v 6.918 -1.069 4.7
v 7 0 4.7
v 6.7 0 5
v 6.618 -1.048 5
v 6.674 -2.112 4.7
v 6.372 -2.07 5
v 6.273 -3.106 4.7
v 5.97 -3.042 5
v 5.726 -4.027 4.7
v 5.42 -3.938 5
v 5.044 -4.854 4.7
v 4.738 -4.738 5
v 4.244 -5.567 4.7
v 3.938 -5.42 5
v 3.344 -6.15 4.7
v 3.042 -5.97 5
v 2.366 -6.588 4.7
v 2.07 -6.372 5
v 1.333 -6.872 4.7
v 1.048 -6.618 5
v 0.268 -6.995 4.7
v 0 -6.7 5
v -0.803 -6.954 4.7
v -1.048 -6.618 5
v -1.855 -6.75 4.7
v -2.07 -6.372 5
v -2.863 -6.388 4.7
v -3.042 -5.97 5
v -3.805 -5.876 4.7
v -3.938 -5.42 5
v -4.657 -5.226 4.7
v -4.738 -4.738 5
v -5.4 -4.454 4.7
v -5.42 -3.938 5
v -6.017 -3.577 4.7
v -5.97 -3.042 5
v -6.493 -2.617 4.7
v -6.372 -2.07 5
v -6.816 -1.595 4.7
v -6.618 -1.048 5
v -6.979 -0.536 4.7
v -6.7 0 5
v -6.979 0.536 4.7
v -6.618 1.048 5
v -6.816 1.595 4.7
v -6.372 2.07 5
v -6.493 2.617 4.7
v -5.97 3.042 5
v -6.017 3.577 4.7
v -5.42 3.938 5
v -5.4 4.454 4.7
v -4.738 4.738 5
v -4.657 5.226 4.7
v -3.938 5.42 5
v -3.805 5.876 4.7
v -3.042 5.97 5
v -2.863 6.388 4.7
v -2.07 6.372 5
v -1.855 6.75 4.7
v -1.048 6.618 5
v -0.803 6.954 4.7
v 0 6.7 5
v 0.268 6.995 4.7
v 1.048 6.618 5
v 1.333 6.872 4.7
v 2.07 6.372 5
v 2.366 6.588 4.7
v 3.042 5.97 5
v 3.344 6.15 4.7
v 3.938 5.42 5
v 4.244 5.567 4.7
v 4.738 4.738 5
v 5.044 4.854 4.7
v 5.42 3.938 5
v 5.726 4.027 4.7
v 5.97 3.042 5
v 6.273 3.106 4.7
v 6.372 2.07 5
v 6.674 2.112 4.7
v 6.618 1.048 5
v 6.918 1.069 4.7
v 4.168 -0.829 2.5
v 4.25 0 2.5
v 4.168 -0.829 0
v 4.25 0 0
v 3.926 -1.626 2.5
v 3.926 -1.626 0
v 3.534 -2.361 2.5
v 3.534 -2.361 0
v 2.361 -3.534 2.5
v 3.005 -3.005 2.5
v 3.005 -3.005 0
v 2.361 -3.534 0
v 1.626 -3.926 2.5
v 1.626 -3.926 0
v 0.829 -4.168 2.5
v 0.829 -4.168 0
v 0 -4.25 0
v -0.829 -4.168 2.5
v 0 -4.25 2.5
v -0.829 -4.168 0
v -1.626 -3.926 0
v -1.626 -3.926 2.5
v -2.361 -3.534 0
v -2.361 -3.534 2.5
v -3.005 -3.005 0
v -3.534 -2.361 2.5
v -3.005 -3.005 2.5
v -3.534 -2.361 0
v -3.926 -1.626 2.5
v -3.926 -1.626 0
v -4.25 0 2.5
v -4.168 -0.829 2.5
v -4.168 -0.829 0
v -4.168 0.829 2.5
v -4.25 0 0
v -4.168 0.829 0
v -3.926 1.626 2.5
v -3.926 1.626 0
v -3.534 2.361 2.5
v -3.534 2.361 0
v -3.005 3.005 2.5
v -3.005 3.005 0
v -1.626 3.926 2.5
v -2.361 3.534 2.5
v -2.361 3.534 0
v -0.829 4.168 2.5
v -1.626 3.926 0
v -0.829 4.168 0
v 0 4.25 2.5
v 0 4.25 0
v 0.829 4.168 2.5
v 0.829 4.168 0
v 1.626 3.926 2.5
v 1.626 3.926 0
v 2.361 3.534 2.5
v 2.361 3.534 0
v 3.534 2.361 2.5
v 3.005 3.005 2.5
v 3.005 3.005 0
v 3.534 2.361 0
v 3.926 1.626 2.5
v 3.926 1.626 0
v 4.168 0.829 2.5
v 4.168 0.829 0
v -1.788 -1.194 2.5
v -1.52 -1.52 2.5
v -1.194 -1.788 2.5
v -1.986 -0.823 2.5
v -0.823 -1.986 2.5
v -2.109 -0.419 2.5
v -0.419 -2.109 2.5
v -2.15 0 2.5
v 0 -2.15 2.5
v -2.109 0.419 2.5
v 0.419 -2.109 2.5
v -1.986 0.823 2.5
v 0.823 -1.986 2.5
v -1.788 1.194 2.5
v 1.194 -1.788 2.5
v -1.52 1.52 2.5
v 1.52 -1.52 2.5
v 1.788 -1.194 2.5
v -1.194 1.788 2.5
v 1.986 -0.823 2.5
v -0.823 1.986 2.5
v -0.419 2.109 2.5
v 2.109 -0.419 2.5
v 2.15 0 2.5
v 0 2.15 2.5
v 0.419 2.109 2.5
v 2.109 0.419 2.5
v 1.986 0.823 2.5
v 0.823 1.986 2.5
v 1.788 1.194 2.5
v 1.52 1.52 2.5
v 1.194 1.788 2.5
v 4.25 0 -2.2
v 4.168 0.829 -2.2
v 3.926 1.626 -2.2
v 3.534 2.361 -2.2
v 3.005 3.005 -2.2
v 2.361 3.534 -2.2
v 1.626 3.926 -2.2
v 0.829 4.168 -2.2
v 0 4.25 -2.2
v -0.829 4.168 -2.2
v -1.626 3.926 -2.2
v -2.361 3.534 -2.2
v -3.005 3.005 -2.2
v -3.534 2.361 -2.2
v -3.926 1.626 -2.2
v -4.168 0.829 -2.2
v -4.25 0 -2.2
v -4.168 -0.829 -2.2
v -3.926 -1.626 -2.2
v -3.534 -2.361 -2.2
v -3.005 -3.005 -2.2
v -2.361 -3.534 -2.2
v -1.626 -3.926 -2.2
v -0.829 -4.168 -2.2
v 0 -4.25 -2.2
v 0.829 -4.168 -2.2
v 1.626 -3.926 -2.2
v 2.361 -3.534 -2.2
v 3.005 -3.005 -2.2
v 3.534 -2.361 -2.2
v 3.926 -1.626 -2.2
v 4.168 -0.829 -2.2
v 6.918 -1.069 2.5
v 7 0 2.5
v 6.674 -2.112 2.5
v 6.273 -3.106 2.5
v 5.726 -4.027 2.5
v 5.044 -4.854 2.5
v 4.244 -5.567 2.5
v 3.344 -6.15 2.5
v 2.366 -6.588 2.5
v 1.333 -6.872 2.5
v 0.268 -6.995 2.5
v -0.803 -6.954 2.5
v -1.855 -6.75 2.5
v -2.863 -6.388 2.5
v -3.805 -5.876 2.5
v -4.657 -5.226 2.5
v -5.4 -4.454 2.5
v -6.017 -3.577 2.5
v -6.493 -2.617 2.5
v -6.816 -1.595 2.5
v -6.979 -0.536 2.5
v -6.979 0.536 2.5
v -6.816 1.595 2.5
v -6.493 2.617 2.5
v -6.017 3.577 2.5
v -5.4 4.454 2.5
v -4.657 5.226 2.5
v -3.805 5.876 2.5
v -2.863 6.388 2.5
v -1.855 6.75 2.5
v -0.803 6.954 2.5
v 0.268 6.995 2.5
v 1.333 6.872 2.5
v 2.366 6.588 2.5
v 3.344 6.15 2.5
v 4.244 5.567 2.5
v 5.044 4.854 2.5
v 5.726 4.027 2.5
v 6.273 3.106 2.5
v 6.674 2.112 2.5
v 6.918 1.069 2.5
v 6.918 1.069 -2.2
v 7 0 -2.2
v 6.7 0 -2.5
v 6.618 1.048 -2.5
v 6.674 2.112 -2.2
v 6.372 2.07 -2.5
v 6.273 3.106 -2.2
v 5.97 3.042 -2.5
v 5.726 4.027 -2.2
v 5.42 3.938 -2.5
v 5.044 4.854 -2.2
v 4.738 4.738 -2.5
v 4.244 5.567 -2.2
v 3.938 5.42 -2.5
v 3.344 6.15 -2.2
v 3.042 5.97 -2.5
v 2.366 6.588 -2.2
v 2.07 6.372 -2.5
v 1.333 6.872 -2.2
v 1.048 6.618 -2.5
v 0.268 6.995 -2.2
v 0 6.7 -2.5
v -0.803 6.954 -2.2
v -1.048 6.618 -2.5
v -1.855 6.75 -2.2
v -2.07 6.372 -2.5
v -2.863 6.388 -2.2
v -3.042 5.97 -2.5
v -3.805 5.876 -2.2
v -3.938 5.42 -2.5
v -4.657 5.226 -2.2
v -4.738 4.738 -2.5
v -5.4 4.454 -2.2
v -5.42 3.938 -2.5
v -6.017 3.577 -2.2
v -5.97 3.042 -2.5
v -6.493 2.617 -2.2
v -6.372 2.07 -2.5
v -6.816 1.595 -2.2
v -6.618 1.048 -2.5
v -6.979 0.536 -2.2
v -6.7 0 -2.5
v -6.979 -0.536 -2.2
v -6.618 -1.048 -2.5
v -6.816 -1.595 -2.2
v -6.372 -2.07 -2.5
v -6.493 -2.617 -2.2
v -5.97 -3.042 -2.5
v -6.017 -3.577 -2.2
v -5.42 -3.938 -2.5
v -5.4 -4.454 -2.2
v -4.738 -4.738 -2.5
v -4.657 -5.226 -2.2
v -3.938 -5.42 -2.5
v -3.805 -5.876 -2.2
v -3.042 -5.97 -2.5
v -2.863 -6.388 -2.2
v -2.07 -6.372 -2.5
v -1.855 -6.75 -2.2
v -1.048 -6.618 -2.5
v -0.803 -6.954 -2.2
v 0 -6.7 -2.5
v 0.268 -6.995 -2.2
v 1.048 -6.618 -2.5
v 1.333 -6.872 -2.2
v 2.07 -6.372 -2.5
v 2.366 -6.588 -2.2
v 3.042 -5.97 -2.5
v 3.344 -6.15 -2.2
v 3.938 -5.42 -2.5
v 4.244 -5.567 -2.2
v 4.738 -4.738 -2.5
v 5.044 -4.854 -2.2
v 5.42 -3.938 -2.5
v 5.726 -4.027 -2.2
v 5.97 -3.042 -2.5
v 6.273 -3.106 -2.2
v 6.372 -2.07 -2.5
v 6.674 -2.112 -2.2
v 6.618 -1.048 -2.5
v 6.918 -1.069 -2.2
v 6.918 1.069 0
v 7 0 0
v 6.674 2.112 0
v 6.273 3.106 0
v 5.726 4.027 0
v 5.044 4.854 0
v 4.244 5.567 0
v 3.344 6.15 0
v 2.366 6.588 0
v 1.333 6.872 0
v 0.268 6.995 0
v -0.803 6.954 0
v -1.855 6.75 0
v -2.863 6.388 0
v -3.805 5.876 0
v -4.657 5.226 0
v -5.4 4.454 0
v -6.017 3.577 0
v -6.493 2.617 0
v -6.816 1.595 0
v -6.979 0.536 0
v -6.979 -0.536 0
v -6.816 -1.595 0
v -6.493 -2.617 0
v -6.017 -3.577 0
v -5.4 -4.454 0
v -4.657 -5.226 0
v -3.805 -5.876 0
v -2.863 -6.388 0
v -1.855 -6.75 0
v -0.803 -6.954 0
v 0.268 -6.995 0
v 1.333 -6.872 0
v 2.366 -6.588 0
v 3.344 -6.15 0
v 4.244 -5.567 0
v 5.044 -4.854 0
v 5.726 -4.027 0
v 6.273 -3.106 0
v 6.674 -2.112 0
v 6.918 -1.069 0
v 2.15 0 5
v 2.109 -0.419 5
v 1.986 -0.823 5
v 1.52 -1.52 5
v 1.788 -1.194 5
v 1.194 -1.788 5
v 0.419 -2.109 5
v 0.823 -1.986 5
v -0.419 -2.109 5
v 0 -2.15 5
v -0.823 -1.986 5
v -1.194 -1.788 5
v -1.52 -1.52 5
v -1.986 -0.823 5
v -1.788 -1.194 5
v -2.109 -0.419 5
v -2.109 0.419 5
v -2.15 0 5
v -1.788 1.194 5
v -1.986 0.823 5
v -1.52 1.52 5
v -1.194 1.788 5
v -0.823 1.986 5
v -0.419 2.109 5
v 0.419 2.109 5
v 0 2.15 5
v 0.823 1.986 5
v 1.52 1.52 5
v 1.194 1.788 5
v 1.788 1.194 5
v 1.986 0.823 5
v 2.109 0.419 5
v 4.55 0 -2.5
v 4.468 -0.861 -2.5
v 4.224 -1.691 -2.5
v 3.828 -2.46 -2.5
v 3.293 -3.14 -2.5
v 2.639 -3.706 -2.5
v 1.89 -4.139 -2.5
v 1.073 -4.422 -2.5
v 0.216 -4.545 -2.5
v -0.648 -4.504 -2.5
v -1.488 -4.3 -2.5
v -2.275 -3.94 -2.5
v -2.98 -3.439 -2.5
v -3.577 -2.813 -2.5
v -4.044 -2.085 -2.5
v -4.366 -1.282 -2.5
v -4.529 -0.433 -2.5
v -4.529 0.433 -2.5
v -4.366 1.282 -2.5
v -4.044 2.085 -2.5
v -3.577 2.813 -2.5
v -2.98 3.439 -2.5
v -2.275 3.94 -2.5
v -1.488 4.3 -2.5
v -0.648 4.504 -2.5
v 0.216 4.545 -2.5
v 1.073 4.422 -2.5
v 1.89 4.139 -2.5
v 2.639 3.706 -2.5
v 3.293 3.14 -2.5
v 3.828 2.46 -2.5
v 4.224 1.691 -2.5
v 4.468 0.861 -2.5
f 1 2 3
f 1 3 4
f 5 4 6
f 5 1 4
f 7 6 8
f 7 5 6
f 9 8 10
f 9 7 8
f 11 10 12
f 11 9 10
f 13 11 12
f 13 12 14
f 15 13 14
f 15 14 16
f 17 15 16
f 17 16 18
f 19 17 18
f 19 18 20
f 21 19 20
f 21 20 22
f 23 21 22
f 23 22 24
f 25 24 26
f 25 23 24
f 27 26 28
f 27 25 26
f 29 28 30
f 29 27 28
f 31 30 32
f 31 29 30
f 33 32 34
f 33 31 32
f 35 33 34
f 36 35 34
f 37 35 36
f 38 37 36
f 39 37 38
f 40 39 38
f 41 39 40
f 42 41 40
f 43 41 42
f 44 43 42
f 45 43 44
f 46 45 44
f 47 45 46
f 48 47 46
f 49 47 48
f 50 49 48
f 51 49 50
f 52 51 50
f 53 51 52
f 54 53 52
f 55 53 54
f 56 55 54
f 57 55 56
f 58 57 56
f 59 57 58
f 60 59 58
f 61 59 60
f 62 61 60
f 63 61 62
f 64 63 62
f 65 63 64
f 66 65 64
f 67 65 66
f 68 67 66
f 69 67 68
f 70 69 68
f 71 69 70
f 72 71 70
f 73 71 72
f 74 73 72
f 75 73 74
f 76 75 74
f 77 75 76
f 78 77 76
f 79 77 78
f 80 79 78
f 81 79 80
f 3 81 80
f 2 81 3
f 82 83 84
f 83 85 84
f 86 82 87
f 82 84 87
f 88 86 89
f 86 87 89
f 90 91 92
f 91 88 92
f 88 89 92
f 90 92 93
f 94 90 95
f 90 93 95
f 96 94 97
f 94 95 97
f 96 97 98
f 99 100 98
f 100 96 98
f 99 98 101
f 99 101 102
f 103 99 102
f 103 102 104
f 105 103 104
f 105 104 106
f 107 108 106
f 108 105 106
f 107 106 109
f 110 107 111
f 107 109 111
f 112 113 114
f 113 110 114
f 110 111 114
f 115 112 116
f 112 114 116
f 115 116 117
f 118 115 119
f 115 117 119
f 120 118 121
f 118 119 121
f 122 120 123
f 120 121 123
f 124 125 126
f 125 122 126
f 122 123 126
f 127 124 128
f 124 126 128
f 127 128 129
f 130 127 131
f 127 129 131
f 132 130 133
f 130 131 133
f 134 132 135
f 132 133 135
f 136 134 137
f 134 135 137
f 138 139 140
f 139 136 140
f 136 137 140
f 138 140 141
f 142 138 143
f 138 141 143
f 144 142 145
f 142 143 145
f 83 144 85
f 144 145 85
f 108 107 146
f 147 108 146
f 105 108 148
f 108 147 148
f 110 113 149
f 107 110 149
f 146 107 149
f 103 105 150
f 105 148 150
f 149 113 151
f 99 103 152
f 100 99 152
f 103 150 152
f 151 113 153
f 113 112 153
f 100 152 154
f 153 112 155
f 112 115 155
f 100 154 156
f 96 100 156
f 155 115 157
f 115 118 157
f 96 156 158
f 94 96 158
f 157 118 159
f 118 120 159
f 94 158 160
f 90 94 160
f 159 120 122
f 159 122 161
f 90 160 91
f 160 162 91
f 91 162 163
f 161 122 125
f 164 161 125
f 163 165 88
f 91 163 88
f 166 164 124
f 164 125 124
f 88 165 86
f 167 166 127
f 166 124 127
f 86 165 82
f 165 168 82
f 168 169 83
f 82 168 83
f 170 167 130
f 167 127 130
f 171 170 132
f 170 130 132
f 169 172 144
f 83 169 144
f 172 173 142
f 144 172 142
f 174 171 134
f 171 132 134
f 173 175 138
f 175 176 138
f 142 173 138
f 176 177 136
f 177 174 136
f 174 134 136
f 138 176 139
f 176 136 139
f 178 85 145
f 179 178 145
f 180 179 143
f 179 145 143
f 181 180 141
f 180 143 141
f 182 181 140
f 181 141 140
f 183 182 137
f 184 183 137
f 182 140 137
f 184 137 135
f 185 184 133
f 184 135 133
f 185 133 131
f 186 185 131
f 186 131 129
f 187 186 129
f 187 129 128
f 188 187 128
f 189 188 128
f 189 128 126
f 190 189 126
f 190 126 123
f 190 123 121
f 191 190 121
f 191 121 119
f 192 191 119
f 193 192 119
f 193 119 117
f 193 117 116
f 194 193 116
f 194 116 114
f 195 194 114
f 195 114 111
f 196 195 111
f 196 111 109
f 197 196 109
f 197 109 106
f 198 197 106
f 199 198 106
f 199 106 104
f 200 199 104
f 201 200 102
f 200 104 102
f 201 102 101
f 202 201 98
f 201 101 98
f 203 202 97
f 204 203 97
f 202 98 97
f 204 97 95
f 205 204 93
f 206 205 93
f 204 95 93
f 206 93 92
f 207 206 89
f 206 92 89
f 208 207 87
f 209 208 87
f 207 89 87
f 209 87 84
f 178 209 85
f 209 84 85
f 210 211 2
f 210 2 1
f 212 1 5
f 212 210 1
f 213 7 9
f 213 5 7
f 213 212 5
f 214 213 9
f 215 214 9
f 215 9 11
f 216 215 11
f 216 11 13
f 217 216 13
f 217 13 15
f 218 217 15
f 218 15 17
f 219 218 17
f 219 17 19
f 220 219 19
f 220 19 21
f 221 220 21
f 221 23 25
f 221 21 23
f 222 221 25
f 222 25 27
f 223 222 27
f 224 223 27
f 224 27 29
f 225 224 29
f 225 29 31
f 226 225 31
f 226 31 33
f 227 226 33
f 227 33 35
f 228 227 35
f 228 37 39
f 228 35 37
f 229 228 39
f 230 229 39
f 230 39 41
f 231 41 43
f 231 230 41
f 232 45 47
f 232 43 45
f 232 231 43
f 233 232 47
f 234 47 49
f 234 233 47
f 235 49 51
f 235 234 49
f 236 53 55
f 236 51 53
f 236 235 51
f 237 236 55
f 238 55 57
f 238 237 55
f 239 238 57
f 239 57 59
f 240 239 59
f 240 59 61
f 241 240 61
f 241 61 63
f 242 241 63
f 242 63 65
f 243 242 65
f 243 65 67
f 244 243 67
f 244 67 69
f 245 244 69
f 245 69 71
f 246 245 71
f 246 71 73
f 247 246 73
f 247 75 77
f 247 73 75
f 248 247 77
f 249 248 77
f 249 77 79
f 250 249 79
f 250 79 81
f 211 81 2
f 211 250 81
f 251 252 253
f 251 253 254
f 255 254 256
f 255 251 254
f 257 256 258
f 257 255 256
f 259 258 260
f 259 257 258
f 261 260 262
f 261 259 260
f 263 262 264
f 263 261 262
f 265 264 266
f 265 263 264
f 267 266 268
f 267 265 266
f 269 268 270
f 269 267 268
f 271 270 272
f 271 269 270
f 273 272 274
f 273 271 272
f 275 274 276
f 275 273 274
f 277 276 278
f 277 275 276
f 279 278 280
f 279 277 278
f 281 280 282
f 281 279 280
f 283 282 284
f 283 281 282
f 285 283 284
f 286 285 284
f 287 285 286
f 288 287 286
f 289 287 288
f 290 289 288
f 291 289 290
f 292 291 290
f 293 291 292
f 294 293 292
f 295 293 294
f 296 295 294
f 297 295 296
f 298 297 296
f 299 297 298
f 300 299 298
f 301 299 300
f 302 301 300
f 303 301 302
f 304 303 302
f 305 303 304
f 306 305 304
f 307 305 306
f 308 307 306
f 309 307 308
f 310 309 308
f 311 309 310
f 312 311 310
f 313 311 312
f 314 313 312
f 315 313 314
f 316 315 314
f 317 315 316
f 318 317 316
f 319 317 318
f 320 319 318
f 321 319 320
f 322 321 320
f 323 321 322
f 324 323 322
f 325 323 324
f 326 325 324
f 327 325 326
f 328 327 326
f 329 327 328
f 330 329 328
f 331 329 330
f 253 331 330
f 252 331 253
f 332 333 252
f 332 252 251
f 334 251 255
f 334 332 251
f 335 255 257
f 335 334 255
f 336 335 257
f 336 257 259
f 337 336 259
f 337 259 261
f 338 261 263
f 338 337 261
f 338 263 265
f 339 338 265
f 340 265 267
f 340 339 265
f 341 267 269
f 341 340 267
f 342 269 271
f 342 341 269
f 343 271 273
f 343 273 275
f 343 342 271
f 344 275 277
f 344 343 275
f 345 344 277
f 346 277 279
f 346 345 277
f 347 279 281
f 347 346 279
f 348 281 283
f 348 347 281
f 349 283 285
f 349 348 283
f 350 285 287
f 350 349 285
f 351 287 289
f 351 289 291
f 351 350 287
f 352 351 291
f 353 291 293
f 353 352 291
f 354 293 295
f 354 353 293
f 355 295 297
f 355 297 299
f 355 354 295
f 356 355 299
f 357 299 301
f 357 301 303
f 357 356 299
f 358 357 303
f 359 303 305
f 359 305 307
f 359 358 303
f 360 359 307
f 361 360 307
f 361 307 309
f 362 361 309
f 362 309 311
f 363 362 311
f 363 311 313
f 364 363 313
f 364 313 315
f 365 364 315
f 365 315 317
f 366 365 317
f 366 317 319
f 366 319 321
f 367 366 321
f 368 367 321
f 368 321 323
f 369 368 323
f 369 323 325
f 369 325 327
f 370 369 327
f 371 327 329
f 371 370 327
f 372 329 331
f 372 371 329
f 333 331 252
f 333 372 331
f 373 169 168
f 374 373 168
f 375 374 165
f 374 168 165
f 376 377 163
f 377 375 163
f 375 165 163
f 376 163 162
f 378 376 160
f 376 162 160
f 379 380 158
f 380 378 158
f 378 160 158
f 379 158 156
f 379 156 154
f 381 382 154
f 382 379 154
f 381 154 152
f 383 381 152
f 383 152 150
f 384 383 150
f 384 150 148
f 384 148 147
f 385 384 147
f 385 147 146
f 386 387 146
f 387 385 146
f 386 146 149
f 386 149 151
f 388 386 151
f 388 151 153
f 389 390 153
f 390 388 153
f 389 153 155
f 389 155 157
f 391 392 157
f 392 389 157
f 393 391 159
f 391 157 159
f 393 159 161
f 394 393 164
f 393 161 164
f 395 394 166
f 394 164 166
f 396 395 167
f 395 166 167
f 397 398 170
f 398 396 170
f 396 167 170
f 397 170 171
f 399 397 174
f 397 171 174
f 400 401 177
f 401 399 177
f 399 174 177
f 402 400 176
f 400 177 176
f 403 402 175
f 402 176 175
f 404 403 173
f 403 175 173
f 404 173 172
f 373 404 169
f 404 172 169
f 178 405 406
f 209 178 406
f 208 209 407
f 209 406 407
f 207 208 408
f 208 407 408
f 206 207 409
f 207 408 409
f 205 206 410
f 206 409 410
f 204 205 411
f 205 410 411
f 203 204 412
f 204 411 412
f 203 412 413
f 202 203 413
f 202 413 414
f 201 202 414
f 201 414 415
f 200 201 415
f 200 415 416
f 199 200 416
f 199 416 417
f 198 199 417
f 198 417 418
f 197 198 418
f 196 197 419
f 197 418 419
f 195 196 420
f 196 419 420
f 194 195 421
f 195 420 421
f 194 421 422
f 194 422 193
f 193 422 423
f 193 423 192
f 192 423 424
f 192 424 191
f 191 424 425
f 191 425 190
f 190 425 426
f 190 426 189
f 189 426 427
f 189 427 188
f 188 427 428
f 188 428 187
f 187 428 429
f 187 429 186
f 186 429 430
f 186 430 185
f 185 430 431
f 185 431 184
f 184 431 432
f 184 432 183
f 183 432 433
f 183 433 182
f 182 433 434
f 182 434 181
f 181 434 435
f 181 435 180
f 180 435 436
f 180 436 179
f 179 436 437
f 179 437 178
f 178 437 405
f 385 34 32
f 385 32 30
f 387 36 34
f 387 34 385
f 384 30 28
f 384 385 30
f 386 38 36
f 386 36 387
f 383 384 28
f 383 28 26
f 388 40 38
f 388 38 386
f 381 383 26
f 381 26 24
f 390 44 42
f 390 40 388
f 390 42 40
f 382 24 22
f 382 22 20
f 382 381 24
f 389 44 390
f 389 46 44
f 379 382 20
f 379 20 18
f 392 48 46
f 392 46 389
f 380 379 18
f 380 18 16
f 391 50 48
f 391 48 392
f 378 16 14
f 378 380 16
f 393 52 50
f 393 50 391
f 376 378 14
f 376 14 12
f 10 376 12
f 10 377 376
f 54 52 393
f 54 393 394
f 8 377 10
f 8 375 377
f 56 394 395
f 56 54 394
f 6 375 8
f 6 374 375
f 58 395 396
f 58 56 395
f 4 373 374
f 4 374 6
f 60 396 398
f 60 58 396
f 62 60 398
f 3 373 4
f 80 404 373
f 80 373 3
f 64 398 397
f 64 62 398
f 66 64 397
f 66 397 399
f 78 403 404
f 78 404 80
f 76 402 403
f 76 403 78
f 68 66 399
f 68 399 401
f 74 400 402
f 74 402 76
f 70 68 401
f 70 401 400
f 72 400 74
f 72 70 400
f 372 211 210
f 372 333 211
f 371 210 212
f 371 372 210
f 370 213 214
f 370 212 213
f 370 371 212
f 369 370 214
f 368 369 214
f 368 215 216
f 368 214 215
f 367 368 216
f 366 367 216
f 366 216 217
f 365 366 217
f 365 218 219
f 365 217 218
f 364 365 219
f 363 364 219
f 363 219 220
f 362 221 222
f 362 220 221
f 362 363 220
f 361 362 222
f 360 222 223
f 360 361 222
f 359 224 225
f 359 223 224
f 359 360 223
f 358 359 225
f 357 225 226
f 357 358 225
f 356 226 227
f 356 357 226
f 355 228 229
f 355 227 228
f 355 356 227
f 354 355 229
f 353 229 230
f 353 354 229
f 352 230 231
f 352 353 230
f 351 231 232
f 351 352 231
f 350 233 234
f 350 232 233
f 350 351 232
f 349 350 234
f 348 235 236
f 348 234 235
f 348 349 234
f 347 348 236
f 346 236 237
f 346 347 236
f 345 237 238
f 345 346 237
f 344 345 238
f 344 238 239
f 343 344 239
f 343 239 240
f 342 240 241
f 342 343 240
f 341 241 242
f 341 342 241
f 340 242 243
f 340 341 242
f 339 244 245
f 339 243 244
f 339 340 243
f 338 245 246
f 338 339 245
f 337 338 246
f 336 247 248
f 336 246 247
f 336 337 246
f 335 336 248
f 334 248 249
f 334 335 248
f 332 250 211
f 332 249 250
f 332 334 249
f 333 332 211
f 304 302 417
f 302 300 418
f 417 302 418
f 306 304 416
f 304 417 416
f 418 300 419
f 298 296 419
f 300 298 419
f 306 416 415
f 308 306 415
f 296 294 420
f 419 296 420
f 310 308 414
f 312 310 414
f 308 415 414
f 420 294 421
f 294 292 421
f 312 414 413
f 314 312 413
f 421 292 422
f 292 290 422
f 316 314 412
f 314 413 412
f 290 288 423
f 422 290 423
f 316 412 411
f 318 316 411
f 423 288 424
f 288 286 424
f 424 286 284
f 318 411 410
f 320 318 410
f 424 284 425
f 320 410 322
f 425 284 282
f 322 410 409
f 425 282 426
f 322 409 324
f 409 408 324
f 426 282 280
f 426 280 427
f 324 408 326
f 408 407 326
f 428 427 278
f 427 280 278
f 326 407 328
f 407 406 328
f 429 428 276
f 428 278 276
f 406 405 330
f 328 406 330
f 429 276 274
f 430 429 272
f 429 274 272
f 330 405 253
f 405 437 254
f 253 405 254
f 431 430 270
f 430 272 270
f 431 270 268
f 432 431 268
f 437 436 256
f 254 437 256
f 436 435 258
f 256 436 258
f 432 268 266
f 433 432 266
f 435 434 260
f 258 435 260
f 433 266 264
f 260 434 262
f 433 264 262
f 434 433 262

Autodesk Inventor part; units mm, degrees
ref_plane "YZ Plane" through (0, 0, 0) normal (1, 0, 0) x (0, 1, 0)
ref_plane "XZ Plane" through (0, 0, 0) normal (0, 1, 0) x (-1, 0, 0)
ref_plane "XY Plane" through (0, 0, 0) normal (0, 0, 1) x (1, 0, 0)
sketch "スケッチ1" plane through (0, 0, 0) normal (0, 0, 1) x (1, 0, 0)
  circle A0 centre (0, 0) radius 4.25
  circle A1 centre (0, 0) radius 7
  dimension "d0" = 8.5
  dimension "d1" = 14
extrude "押し出し1" add sketch "スケッチ1" along normal mid plane 5
sketch "スケッチ2" plane through (0, 0, 2.5) normal (0, 0, 1) x (1, 0, 0)
  circle A0 centre (0, 0) radius 7 projected
  circle A1 centre (0, 0) radius 2.15
  dimension "d9" = 4.3
extrude "押し出し2" add sketch "スケッチ2" along normal blind 2.5
chamfer "面取り2" distance 0.3 angle 45 3 edges at (-7, 0, 5) (-7, 0, -2.5) (-4.25, 0, -2.5)
properties part number "base40" material "ABS プラスチック"
